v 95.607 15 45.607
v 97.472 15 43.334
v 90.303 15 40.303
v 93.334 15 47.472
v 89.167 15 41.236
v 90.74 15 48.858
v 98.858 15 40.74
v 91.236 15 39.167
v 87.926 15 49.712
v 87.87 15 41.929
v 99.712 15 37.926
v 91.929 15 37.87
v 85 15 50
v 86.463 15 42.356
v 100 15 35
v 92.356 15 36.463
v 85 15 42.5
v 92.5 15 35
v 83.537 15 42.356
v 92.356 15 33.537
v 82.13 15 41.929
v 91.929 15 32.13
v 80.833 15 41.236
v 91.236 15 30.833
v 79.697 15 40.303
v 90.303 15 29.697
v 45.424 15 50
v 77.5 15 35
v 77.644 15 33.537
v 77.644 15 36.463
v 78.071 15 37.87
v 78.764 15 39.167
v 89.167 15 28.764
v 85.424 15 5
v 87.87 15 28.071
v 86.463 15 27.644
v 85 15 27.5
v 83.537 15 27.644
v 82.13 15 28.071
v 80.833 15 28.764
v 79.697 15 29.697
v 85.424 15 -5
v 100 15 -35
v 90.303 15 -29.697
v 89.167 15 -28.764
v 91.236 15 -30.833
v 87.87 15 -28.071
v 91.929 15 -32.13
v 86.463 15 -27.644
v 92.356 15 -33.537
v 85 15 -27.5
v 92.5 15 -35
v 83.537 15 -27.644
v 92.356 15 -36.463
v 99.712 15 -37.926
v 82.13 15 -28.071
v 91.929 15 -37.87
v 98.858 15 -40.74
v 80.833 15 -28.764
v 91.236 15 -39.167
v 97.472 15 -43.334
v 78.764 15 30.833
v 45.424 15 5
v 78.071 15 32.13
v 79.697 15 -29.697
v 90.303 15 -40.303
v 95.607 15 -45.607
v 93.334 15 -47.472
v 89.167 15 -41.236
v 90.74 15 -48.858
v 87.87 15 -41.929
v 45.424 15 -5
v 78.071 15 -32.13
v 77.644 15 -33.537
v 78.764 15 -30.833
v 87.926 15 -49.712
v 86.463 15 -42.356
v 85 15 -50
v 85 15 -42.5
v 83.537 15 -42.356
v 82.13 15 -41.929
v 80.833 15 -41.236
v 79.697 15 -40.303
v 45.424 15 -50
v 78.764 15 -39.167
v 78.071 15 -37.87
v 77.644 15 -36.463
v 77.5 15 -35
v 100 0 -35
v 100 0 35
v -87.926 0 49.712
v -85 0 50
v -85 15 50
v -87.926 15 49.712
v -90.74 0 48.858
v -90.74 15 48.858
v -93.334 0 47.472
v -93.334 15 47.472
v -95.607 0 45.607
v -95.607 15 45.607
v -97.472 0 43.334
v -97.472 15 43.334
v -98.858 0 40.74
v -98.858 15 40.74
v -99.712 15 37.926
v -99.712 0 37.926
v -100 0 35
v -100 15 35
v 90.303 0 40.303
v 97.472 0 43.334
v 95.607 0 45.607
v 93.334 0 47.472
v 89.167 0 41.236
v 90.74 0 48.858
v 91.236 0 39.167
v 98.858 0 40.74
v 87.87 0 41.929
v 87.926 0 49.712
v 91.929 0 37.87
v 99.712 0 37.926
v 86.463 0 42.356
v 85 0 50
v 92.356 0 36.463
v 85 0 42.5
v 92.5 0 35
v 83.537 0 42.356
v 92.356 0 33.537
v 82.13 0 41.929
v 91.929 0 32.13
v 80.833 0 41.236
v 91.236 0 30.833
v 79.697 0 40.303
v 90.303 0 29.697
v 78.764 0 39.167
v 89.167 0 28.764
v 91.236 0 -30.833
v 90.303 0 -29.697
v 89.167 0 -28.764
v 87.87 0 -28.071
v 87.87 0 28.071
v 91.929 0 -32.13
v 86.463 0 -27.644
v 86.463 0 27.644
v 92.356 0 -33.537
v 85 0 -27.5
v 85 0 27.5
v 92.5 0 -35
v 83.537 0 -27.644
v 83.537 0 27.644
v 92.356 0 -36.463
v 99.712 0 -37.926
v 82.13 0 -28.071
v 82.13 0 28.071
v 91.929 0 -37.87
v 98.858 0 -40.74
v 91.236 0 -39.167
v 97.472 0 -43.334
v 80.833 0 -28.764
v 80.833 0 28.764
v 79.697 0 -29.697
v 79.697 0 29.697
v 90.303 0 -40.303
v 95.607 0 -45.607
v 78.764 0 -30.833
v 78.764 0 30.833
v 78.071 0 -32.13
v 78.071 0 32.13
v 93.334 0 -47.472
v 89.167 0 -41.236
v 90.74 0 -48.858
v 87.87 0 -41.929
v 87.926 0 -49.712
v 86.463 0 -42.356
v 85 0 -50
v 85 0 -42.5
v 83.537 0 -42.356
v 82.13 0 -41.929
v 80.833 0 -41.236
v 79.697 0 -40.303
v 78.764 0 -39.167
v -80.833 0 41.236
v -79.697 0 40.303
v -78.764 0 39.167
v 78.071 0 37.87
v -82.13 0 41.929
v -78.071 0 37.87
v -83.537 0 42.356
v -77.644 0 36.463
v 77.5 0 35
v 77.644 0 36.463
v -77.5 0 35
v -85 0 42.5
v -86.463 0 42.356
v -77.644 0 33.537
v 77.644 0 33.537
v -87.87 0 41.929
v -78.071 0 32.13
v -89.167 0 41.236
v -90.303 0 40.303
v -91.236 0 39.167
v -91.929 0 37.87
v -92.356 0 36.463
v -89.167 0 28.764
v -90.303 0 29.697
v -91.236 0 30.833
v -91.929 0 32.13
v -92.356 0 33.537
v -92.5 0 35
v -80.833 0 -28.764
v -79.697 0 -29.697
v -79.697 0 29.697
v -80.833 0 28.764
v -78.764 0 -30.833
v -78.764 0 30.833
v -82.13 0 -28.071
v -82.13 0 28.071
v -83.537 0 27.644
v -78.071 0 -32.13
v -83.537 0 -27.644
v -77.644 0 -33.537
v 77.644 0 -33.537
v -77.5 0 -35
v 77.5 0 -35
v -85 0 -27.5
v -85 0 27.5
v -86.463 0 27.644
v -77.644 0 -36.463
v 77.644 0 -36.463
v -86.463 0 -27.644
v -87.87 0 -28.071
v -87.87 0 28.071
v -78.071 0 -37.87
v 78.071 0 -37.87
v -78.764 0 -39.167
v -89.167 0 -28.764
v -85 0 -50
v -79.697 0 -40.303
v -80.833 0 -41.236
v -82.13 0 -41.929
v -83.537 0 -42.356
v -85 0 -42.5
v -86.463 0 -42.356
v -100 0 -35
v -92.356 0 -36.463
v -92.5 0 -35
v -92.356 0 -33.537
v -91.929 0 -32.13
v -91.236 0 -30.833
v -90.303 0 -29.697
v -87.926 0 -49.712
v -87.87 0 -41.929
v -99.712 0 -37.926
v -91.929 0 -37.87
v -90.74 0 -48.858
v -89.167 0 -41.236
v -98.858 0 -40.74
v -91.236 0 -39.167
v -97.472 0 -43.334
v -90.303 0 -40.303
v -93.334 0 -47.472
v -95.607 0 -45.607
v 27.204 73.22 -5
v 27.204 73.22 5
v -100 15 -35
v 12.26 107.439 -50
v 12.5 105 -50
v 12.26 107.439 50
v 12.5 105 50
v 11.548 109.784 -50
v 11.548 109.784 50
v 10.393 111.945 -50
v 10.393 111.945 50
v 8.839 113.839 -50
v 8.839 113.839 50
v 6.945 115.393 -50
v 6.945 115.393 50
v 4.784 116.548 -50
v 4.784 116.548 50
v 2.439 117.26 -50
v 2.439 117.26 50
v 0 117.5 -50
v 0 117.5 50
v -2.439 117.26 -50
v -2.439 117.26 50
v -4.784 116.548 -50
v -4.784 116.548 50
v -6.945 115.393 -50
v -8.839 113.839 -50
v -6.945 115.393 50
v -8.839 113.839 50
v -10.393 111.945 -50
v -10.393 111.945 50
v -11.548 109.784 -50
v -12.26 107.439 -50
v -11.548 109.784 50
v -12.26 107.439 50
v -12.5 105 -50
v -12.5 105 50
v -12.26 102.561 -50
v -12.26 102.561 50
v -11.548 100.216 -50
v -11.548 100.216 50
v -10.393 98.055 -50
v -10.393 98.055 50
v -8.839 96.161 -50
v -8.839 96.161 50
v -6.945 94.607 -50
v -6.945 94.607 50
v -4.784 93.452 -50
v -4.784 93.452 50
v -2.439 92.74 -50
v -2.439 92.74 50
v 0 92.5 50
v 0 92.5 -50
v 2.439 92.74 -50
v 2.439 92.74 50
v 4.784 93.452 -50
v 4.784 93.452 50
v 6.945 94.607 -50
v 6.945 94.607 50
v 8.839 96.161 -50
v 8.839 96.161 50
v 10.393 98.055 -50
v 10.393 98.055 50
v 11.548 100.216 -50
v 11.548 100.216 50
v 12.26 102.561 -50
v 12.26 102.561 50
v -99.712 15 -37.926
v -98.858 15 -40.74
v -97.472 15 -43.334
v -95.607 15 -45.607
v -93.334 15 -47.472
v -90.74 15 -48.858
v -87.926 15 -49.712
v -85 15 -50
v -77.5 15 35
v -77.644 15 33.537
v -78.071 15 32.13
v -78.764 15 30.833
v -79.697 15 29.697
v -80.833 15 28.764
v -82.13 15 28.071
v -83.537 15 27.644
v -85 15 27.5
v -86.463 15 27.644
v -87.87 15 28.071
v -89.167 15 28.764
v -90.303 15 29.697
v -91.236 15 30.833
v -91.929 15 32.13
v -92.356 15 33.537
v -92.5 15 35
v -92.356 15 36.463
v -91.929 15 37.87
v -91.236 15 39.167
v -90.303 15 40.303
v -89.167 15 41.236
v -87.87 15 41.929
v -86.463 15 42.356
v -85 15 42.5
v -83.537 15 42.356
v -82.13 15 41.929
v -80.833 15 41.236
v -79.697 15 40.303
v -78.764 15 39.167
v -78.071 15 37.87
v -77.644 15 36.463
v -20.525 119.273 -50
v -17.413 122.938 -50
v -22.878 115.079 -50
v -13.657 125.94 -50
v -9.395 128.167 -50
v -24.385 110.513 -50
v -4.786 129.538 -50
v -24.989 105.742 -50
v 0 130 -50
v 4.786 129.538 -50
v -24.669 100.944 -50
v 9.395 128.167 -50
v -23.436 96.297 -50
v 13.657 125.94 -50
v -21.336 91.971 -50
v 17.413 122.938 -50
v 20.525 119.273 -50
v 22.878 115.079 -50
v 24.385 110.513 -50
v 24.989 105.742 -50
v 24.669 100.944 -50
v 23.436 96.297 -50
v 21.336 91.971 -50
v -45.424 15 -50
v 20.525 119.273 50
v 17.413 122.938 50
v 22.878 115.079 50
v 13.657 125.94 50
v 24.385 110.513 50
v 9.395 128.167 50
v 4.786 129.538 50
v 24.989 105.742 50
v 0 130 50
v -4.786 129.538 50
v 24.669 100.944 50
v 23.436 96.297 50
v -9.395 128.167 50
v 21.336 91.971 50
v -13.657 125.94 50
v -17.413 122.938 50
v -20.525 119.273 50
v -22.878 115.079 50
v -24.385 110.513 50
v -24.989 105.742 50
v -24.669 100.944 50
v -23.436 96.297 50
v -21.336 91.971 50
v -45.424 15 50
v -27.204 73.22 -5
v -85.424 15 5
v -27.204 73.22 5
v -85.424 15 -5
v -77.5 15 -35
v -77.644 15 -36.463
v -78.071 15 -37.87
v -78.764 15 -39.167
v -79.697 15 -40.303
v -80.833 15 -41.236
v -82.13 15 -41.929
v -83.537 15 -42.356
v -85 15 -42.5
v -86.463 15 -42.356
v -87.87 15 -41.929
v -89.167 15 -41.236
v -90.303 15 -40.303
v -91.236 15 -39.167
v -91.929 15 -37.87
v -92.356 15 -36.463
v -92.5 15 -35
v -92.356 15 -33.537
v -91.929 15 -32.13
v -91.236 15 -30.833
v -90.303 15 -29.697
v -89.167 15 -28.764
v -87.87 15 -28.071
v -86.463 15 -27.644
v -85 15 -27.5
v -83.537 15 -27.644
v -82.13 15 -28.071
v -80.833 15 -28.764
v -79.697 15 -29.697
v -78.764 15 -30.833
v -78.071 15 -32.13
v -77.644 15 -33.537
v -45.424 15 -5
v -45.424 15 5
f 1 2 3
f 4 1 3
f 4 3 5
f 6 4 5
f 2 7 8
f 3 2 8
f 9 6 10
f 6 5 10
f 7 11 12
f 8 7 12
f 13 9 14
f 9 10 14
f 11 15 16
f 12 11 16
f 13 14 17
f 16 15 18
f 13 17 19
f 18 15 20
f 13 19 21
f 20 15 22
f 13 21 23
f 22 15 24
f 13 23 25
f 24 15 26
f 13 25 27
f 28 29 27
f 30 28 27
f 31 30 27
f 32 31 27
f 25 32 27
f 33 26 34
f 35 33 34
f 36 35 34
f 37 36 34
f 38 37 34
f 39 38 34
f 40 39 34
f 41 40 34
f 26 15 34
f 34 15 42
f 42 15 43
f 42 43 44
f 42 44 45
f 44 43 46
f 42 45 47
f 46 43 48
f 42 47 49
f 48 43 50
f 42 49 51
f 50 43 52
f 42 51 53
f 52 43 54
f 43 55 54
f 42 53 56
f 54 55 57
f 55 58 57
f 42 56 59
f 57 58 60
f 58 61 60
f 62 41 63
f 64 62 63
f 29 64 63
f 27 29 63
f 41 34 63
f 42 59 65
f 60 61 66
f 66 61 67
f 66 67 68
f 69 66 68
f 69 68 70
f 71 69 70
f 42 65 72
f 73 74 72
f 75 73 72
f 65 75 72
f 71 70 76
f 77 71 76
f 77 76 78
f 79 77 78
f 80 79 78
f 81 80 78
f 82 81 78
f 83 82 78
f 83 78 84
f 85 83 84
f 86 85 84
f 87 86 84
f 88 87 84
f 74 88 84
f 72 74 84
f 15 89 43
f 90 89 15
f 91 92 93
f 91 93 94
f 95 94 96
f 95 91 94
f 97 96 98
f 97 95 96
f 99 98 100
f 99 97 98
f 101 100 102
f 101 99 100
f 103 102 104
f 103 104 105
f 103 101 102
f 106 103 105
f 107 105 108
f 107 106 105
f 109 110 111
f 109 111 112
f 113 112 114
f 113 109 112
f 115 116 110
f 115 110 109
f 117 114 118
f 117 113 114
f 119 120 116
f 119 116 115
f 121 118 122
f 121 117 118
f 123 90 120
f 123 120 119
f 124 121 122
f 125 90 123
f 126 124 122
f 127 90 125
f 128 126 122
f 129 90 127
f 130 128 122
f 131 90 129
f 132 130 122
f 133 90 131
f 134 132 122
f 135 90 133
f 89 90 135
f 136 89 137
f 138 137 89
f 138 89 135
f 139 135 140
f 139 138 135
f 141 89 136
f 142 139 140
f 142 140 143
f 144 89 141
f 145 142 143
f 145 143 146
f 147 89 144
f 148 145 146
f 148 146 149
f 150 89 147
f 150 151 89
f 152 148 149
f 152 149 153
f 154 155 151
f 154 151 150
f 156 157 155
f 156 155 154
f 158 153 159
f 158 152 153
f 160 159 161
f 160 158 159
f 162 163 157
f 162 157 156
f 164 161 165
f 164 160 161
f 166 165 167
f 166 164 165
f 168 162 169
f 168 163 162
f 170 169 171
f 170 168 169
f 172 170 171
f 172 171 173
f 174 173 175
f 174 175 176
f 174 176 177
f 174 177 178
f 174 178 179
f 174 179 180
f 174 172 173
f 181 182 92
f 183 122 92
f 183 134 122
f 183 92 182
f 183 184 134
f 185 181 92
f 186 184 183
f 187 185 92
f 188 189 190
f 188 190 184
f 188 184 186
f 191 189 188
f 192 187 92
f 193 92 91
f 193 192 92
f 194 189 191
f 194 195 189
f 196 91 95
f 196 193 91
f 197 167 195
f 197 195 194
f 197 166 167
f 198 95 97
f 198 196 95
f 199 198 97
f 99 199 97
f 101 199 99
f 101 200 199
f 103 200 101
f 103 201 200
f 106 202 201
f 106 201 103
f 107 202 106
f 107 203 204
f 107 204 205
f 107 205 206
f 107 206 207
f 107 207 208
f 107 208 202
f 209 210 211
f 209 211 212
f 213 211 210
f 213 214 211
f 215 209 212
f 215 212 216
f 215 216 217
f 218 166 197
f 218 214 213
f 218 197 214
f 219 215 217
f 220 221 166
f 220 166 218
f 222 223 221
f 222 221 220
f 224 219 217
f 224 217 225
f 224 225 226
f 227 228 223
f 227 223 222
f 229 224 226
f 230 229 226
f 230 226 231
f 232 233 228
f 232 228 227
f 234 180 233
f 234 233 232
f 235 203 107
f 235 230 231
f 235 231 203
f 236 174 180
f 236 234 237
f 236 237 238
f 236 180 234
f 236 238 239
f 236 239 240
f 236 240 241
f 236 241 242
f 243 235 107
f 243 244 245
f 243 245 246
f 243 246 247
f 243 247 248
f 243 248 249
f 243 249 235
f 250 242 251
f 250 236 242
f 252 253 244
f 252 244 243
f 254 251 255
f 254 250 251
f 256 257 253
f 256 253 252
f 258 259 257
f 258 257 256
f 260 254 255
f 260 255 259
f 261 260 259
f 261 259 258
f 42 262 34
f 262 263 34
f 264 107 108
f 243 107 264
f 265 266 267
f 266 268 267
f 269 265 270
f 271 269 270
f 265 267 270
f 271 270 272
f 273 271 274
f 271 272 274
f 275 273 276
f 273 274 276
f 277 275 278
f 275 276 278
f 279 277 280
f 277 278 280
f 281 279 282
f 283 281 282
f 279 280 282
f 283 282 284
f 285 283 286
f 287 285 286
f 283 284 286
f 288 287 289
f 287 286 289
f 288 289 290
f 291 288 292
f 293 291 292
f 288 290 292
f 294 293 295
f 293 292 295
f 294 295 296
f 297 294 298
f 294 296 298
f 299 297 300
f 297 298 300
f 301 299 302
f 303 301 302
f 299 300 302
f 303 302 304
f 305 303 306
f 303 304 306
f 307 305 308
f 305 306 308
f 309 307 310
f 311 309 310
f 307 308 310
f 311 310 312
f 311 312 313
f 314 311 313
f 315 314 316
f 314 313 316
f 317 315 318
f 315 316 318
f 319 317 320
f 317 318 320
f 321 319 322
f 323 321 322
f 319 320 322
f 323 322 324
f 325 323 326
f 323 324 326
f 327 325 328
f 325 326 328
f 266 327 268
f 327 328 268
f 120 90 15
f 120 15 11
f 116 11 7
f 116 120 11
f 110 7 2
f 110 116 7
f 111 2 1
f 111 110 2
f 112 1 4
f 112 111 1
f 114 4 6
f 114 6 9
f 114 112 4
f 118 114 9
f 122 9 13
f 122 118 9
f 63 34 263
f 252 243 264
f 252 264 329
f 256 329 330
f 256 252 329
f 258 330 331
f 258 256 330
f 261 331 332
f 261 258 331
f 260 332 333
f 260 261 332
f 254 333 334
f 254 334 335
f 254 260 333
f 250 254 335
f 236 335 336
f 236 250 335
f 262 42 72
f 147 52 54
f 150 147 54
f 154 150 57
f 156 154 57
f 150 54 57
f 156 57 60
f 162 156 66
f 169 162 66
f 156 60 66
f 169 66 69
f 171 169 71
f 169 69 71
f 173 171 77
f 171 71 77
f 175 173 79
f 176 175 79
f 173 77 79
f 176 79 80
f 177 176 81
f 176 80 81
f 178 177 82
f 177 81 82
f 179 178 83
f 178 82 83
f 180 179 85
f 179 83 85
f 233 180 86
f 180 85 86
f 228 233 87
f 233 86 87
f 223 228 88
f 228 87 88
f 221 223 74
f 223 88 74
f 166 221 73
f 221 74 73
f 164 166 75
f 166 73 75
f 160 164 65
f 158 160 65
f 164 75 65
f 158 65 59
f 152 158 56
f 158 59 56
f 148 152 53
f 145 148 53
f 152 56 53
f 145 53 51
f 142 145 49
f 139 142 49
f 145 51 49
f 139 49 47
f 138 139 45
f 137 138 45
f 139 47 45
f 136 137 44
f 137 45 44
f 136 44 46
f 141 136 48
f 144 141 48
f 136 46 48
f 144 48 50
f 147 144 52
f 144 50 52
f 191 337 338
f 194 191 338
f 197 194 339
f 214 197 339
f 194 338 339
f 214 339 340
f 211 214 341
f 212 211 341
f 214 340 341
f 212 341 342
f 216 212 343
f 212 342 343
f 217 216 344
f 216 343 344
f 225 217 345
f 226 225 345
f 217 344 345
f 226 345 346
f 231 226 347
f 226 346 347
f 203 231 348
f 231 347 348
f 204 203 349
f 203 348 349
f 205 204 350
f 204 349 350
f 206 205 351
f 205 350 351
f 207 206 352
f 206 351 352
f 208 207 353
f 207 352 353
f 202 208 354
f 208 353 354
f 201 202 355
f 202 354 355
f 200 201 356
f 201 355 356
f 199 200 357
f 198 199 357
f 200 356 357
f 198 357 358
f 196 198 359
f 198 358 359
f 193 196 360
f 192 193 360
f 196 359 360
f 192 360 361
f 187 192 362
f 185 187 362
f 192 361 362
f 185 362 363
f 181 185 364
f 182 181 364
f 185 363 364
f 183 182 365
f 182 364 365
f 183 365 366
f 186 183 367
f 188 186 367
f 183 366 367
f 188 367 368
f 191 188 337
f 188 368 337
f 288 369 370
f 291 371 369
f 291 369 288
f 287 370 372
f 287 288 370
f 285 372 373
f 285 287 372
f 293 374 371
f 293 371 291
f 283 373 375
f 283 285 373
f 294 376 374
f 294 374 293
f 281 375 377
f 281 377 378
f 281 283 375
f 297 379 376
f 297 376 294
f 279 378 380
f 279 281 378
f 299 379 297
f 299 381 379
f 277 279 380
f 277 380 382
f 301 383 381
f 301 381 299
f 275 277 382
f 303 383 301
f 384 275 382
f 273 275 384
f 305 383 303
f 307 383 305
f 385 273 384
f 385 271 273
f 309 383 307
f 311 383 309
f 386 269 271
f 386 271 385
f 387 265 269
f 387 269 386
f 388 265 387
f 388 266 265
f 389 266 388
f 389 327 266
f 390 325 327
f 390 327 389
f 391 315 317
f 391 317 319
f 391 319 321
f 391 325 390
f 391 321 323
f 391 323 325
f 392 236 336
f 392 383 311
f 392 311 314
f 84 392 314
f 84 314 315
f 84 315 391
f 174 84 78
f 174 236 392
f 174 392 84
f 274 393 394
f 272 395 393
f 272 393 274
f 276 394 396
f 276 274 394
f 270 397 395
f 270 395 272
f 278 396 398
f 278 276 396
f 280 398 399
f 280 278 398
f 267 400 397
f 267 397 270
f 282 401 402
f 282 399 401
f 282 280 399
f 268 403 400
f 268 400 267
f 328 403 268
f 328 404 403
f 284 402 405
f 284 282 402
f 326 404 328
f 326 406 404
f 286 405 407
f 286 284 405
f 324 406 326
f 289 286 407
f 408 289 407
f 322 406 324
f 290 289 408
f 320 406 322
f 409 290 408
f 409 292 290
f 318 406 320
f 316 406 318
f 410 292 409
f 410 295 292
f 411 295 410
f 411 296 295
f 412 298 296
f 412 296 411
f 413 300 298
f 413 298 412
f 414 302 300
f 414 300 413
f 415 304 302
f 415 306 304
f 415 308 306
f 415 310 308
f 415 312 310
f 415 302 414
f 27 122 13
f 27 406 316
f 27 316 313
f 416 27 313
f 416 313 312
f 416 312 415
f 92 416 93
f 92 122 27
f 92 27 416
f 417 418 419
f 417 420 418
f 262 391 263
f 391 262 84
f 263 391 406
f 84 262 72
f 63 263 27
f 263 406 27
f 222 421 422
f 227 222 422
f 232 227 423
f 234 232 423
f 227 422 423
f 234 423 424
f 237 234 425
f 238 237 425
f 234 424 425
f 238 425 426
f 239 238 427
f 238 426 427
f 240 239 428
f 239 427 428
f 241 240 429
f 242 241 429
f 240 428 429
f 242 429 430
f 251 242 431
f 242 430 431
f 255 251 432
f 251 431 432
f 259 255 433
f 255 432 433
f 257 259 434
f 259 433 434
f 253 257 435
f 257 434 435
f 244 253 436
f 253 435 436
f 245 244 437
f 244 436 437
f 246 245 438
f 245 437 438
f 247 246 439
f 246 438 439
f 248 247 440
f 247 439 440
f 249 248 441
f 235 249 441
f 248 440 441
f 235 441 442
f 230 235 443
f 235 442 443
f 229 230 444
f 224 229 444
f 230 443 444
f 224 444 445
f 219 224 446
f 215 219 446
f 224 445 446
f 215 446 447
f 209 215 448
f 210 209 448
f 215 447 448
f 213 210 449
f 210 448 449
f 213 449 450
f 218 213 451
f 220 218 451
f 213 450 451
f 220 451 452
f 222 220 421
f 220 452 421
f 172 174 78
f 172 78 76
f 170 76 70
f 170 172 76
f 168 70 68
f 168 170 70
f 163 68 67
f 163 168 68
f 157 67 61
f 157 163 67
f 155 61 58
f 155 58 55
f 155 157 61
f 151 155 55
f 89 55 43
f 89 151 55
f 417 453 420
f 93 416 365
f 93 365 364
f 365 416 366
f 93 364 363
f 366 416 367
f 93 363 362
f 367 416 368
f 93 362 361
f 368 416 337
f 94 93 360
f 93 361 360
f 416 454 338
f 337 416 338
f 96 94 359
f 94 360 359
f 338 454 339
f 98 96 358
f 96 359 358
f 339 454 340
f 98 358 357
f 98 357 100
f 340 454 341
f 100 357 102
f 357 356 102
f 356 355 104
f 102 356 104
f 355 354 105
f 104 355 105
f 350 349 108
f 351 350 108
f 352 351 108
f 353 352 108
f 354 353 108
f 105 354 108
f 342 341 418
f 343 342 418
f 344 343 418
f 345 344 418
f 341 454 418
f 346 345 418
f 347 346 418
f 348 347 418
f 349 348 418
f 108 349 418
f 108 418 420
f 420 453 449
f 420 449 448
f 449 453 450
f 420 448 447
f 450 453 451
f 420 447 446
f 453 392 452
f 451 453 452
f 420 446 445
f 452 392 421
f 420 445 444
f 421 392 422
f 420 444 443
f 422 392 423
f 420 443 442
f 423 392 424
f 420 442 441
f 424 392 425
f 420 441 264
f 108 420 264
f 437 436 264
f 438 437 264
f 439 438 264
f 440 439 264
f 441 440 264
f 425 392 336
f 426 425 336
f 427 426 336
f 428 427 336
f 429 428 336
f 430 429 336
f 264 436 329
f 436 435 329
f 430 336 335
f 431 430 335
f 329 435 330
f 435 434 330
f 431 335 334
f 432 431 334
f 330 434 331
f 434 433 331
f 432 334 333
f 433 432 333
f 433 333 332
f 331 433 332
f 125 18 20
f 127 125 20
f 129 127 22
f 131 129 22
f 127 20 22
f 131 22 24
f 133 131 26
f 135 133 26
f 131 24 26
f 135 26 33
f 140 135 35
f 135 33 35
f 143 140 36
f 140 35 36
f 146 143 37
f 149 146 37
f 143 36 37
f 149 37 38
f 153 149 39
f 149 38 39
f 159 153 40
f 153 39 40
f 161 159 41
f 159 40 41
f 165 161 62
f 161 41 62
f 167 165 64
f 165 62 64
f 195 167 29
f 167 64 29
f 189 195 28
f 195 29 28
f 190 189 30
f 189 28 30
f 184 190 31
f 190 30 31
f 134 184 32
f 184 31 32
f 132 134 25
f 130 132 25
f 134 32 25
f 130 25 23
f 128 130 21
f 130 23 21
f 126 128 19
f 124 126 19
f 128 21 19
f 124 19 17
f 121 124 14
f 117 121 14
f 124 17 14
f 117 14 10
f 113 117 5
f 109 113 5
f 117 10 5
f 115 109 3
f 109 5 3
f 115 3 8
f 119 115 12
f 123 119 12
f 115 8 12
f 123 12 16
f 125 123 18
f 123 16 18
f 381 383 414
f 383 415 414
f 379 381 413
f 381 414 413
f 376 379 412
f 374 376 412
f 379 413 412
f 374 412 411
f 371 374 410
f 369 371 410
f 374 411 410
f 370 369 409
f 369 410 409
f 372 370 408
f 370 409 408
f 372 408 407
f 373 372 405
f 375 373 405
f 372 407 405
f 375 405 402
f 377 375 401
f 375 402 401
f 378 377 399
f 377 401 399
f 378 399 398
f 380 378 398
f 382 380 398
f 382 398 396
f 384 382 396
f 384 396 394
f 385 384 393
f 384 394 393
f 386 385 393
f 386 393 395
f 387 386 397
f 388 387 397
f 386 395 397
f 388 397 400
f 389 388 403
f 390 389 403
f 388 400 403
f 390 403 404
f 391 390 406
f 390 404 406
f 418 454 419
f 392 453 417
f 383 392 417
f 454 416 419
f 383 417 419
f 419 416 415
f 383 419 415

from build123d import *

# Parameters (mm, degrees)
BOSS_EXTRUDE1_DEPTH = 15
SKETCH2_R           = 7.5
CUT_EXTRUDE1_DEPTH  = 15
BOSS_EXTRUDE2_DEPTH = 50
SKETCH4_R           = 12.5
CUT_EXTRUDE2_DEPTH  = 50
BOSS_EXTRUDE3_DEPTH = 5


with BuildPart() as part:
    # Sketch1 → Boss-Extrude1 (new body)
    with BuildSketch(Plane(origin=(0, 0, 0), x_dir=(1, 0, 0), z_dir=(0, 1, 0))):
        with BuildLine():
            Line((85, -50), (-85, -50))
            ThreePointArc((-85, -50), (-95.606601718, -45.606601718), (-100, -35))
            Line((-100, -35), (-100, 35))
            ThreePointArc((-100, 35), (-95.606601718, 45.606601718), (-85, 50))
            Line((-85, 50), (85, 50))
            ThreePointArc((85, 50), (95.606601718, 45.606601718), (100, 35))
            Line((100, 35), (100, -35))
            ThreePointArc((100, -35), (95.606601718, -45.606601718), (85, -50))
        make_face()
    extrude(amount=BOSS_EXTRUDE1_DEPTH)

    # Sketch2 → Cut-Extrude1 (cut)
    with BuildSketch(Plane(origin=(0, 15, 0), x_dir=(1, 0, 0), z_dir=(0, 1, 0))):
        with Locations((-85, 35)):
            Circle(SKETCH2_R)
        with Locations((-85, -35)):
            Circle(SKETCH2_R)
        with Locations((85, -35)):
            Circle(SKETCH2_R)
        with Locations((85, 35)):
            Circle(SKETCH2_R)
    extrude(amount=-CUT_EXTRUDE1_DEPTH, mode=Mode.SUBTRACT)

    # Sketch3 → Boss-Extrude2 (add, symmetric)
    with BuildSketch(Plane.XY):
        with BuildLine():
            Line((-45.424155313, 15), (-21.336304632, 91.970721254))
            ThreePointArc((-21.336304632, 91.970721254), (0, 130), (21.336304632, 91.970721254))
            Line((21.336304632, 91.970721254), (45.424155313, 15))
            Line((45.424155313, 15), (-45.424155313, 15))
        make_face()
    extrude(amount=BOSS_EXTRUDE2_DEPTH, both=True)

    # Sketch4 → Cut-Extrude2 (cut, symmetric)
    with BuildSketch(Plane.XY):
        with Locations((0, 105)):
            Circle(SKETCH4_R)
    extrude(amount=CUT_EXTRUDE2_DEPTH, both=True, mode=Mode.SUBTRACT)

    # Sketch6 → Boss-Extrude3 (add, symmetric)
    with BuildSketch(Plane.XY):
        Polygon((-85.424155313, 15), (-27.204379859, 73.219775454), (-45.424155313, 15), align=None)
        Polygon((45.424155313, 15), (27.204379859, 73.219775454), (85.424155313, 15), align=None)
    extrude(amount=BOSS_EXTRUDE3_DEPTH, both=True)


solid = part.part
